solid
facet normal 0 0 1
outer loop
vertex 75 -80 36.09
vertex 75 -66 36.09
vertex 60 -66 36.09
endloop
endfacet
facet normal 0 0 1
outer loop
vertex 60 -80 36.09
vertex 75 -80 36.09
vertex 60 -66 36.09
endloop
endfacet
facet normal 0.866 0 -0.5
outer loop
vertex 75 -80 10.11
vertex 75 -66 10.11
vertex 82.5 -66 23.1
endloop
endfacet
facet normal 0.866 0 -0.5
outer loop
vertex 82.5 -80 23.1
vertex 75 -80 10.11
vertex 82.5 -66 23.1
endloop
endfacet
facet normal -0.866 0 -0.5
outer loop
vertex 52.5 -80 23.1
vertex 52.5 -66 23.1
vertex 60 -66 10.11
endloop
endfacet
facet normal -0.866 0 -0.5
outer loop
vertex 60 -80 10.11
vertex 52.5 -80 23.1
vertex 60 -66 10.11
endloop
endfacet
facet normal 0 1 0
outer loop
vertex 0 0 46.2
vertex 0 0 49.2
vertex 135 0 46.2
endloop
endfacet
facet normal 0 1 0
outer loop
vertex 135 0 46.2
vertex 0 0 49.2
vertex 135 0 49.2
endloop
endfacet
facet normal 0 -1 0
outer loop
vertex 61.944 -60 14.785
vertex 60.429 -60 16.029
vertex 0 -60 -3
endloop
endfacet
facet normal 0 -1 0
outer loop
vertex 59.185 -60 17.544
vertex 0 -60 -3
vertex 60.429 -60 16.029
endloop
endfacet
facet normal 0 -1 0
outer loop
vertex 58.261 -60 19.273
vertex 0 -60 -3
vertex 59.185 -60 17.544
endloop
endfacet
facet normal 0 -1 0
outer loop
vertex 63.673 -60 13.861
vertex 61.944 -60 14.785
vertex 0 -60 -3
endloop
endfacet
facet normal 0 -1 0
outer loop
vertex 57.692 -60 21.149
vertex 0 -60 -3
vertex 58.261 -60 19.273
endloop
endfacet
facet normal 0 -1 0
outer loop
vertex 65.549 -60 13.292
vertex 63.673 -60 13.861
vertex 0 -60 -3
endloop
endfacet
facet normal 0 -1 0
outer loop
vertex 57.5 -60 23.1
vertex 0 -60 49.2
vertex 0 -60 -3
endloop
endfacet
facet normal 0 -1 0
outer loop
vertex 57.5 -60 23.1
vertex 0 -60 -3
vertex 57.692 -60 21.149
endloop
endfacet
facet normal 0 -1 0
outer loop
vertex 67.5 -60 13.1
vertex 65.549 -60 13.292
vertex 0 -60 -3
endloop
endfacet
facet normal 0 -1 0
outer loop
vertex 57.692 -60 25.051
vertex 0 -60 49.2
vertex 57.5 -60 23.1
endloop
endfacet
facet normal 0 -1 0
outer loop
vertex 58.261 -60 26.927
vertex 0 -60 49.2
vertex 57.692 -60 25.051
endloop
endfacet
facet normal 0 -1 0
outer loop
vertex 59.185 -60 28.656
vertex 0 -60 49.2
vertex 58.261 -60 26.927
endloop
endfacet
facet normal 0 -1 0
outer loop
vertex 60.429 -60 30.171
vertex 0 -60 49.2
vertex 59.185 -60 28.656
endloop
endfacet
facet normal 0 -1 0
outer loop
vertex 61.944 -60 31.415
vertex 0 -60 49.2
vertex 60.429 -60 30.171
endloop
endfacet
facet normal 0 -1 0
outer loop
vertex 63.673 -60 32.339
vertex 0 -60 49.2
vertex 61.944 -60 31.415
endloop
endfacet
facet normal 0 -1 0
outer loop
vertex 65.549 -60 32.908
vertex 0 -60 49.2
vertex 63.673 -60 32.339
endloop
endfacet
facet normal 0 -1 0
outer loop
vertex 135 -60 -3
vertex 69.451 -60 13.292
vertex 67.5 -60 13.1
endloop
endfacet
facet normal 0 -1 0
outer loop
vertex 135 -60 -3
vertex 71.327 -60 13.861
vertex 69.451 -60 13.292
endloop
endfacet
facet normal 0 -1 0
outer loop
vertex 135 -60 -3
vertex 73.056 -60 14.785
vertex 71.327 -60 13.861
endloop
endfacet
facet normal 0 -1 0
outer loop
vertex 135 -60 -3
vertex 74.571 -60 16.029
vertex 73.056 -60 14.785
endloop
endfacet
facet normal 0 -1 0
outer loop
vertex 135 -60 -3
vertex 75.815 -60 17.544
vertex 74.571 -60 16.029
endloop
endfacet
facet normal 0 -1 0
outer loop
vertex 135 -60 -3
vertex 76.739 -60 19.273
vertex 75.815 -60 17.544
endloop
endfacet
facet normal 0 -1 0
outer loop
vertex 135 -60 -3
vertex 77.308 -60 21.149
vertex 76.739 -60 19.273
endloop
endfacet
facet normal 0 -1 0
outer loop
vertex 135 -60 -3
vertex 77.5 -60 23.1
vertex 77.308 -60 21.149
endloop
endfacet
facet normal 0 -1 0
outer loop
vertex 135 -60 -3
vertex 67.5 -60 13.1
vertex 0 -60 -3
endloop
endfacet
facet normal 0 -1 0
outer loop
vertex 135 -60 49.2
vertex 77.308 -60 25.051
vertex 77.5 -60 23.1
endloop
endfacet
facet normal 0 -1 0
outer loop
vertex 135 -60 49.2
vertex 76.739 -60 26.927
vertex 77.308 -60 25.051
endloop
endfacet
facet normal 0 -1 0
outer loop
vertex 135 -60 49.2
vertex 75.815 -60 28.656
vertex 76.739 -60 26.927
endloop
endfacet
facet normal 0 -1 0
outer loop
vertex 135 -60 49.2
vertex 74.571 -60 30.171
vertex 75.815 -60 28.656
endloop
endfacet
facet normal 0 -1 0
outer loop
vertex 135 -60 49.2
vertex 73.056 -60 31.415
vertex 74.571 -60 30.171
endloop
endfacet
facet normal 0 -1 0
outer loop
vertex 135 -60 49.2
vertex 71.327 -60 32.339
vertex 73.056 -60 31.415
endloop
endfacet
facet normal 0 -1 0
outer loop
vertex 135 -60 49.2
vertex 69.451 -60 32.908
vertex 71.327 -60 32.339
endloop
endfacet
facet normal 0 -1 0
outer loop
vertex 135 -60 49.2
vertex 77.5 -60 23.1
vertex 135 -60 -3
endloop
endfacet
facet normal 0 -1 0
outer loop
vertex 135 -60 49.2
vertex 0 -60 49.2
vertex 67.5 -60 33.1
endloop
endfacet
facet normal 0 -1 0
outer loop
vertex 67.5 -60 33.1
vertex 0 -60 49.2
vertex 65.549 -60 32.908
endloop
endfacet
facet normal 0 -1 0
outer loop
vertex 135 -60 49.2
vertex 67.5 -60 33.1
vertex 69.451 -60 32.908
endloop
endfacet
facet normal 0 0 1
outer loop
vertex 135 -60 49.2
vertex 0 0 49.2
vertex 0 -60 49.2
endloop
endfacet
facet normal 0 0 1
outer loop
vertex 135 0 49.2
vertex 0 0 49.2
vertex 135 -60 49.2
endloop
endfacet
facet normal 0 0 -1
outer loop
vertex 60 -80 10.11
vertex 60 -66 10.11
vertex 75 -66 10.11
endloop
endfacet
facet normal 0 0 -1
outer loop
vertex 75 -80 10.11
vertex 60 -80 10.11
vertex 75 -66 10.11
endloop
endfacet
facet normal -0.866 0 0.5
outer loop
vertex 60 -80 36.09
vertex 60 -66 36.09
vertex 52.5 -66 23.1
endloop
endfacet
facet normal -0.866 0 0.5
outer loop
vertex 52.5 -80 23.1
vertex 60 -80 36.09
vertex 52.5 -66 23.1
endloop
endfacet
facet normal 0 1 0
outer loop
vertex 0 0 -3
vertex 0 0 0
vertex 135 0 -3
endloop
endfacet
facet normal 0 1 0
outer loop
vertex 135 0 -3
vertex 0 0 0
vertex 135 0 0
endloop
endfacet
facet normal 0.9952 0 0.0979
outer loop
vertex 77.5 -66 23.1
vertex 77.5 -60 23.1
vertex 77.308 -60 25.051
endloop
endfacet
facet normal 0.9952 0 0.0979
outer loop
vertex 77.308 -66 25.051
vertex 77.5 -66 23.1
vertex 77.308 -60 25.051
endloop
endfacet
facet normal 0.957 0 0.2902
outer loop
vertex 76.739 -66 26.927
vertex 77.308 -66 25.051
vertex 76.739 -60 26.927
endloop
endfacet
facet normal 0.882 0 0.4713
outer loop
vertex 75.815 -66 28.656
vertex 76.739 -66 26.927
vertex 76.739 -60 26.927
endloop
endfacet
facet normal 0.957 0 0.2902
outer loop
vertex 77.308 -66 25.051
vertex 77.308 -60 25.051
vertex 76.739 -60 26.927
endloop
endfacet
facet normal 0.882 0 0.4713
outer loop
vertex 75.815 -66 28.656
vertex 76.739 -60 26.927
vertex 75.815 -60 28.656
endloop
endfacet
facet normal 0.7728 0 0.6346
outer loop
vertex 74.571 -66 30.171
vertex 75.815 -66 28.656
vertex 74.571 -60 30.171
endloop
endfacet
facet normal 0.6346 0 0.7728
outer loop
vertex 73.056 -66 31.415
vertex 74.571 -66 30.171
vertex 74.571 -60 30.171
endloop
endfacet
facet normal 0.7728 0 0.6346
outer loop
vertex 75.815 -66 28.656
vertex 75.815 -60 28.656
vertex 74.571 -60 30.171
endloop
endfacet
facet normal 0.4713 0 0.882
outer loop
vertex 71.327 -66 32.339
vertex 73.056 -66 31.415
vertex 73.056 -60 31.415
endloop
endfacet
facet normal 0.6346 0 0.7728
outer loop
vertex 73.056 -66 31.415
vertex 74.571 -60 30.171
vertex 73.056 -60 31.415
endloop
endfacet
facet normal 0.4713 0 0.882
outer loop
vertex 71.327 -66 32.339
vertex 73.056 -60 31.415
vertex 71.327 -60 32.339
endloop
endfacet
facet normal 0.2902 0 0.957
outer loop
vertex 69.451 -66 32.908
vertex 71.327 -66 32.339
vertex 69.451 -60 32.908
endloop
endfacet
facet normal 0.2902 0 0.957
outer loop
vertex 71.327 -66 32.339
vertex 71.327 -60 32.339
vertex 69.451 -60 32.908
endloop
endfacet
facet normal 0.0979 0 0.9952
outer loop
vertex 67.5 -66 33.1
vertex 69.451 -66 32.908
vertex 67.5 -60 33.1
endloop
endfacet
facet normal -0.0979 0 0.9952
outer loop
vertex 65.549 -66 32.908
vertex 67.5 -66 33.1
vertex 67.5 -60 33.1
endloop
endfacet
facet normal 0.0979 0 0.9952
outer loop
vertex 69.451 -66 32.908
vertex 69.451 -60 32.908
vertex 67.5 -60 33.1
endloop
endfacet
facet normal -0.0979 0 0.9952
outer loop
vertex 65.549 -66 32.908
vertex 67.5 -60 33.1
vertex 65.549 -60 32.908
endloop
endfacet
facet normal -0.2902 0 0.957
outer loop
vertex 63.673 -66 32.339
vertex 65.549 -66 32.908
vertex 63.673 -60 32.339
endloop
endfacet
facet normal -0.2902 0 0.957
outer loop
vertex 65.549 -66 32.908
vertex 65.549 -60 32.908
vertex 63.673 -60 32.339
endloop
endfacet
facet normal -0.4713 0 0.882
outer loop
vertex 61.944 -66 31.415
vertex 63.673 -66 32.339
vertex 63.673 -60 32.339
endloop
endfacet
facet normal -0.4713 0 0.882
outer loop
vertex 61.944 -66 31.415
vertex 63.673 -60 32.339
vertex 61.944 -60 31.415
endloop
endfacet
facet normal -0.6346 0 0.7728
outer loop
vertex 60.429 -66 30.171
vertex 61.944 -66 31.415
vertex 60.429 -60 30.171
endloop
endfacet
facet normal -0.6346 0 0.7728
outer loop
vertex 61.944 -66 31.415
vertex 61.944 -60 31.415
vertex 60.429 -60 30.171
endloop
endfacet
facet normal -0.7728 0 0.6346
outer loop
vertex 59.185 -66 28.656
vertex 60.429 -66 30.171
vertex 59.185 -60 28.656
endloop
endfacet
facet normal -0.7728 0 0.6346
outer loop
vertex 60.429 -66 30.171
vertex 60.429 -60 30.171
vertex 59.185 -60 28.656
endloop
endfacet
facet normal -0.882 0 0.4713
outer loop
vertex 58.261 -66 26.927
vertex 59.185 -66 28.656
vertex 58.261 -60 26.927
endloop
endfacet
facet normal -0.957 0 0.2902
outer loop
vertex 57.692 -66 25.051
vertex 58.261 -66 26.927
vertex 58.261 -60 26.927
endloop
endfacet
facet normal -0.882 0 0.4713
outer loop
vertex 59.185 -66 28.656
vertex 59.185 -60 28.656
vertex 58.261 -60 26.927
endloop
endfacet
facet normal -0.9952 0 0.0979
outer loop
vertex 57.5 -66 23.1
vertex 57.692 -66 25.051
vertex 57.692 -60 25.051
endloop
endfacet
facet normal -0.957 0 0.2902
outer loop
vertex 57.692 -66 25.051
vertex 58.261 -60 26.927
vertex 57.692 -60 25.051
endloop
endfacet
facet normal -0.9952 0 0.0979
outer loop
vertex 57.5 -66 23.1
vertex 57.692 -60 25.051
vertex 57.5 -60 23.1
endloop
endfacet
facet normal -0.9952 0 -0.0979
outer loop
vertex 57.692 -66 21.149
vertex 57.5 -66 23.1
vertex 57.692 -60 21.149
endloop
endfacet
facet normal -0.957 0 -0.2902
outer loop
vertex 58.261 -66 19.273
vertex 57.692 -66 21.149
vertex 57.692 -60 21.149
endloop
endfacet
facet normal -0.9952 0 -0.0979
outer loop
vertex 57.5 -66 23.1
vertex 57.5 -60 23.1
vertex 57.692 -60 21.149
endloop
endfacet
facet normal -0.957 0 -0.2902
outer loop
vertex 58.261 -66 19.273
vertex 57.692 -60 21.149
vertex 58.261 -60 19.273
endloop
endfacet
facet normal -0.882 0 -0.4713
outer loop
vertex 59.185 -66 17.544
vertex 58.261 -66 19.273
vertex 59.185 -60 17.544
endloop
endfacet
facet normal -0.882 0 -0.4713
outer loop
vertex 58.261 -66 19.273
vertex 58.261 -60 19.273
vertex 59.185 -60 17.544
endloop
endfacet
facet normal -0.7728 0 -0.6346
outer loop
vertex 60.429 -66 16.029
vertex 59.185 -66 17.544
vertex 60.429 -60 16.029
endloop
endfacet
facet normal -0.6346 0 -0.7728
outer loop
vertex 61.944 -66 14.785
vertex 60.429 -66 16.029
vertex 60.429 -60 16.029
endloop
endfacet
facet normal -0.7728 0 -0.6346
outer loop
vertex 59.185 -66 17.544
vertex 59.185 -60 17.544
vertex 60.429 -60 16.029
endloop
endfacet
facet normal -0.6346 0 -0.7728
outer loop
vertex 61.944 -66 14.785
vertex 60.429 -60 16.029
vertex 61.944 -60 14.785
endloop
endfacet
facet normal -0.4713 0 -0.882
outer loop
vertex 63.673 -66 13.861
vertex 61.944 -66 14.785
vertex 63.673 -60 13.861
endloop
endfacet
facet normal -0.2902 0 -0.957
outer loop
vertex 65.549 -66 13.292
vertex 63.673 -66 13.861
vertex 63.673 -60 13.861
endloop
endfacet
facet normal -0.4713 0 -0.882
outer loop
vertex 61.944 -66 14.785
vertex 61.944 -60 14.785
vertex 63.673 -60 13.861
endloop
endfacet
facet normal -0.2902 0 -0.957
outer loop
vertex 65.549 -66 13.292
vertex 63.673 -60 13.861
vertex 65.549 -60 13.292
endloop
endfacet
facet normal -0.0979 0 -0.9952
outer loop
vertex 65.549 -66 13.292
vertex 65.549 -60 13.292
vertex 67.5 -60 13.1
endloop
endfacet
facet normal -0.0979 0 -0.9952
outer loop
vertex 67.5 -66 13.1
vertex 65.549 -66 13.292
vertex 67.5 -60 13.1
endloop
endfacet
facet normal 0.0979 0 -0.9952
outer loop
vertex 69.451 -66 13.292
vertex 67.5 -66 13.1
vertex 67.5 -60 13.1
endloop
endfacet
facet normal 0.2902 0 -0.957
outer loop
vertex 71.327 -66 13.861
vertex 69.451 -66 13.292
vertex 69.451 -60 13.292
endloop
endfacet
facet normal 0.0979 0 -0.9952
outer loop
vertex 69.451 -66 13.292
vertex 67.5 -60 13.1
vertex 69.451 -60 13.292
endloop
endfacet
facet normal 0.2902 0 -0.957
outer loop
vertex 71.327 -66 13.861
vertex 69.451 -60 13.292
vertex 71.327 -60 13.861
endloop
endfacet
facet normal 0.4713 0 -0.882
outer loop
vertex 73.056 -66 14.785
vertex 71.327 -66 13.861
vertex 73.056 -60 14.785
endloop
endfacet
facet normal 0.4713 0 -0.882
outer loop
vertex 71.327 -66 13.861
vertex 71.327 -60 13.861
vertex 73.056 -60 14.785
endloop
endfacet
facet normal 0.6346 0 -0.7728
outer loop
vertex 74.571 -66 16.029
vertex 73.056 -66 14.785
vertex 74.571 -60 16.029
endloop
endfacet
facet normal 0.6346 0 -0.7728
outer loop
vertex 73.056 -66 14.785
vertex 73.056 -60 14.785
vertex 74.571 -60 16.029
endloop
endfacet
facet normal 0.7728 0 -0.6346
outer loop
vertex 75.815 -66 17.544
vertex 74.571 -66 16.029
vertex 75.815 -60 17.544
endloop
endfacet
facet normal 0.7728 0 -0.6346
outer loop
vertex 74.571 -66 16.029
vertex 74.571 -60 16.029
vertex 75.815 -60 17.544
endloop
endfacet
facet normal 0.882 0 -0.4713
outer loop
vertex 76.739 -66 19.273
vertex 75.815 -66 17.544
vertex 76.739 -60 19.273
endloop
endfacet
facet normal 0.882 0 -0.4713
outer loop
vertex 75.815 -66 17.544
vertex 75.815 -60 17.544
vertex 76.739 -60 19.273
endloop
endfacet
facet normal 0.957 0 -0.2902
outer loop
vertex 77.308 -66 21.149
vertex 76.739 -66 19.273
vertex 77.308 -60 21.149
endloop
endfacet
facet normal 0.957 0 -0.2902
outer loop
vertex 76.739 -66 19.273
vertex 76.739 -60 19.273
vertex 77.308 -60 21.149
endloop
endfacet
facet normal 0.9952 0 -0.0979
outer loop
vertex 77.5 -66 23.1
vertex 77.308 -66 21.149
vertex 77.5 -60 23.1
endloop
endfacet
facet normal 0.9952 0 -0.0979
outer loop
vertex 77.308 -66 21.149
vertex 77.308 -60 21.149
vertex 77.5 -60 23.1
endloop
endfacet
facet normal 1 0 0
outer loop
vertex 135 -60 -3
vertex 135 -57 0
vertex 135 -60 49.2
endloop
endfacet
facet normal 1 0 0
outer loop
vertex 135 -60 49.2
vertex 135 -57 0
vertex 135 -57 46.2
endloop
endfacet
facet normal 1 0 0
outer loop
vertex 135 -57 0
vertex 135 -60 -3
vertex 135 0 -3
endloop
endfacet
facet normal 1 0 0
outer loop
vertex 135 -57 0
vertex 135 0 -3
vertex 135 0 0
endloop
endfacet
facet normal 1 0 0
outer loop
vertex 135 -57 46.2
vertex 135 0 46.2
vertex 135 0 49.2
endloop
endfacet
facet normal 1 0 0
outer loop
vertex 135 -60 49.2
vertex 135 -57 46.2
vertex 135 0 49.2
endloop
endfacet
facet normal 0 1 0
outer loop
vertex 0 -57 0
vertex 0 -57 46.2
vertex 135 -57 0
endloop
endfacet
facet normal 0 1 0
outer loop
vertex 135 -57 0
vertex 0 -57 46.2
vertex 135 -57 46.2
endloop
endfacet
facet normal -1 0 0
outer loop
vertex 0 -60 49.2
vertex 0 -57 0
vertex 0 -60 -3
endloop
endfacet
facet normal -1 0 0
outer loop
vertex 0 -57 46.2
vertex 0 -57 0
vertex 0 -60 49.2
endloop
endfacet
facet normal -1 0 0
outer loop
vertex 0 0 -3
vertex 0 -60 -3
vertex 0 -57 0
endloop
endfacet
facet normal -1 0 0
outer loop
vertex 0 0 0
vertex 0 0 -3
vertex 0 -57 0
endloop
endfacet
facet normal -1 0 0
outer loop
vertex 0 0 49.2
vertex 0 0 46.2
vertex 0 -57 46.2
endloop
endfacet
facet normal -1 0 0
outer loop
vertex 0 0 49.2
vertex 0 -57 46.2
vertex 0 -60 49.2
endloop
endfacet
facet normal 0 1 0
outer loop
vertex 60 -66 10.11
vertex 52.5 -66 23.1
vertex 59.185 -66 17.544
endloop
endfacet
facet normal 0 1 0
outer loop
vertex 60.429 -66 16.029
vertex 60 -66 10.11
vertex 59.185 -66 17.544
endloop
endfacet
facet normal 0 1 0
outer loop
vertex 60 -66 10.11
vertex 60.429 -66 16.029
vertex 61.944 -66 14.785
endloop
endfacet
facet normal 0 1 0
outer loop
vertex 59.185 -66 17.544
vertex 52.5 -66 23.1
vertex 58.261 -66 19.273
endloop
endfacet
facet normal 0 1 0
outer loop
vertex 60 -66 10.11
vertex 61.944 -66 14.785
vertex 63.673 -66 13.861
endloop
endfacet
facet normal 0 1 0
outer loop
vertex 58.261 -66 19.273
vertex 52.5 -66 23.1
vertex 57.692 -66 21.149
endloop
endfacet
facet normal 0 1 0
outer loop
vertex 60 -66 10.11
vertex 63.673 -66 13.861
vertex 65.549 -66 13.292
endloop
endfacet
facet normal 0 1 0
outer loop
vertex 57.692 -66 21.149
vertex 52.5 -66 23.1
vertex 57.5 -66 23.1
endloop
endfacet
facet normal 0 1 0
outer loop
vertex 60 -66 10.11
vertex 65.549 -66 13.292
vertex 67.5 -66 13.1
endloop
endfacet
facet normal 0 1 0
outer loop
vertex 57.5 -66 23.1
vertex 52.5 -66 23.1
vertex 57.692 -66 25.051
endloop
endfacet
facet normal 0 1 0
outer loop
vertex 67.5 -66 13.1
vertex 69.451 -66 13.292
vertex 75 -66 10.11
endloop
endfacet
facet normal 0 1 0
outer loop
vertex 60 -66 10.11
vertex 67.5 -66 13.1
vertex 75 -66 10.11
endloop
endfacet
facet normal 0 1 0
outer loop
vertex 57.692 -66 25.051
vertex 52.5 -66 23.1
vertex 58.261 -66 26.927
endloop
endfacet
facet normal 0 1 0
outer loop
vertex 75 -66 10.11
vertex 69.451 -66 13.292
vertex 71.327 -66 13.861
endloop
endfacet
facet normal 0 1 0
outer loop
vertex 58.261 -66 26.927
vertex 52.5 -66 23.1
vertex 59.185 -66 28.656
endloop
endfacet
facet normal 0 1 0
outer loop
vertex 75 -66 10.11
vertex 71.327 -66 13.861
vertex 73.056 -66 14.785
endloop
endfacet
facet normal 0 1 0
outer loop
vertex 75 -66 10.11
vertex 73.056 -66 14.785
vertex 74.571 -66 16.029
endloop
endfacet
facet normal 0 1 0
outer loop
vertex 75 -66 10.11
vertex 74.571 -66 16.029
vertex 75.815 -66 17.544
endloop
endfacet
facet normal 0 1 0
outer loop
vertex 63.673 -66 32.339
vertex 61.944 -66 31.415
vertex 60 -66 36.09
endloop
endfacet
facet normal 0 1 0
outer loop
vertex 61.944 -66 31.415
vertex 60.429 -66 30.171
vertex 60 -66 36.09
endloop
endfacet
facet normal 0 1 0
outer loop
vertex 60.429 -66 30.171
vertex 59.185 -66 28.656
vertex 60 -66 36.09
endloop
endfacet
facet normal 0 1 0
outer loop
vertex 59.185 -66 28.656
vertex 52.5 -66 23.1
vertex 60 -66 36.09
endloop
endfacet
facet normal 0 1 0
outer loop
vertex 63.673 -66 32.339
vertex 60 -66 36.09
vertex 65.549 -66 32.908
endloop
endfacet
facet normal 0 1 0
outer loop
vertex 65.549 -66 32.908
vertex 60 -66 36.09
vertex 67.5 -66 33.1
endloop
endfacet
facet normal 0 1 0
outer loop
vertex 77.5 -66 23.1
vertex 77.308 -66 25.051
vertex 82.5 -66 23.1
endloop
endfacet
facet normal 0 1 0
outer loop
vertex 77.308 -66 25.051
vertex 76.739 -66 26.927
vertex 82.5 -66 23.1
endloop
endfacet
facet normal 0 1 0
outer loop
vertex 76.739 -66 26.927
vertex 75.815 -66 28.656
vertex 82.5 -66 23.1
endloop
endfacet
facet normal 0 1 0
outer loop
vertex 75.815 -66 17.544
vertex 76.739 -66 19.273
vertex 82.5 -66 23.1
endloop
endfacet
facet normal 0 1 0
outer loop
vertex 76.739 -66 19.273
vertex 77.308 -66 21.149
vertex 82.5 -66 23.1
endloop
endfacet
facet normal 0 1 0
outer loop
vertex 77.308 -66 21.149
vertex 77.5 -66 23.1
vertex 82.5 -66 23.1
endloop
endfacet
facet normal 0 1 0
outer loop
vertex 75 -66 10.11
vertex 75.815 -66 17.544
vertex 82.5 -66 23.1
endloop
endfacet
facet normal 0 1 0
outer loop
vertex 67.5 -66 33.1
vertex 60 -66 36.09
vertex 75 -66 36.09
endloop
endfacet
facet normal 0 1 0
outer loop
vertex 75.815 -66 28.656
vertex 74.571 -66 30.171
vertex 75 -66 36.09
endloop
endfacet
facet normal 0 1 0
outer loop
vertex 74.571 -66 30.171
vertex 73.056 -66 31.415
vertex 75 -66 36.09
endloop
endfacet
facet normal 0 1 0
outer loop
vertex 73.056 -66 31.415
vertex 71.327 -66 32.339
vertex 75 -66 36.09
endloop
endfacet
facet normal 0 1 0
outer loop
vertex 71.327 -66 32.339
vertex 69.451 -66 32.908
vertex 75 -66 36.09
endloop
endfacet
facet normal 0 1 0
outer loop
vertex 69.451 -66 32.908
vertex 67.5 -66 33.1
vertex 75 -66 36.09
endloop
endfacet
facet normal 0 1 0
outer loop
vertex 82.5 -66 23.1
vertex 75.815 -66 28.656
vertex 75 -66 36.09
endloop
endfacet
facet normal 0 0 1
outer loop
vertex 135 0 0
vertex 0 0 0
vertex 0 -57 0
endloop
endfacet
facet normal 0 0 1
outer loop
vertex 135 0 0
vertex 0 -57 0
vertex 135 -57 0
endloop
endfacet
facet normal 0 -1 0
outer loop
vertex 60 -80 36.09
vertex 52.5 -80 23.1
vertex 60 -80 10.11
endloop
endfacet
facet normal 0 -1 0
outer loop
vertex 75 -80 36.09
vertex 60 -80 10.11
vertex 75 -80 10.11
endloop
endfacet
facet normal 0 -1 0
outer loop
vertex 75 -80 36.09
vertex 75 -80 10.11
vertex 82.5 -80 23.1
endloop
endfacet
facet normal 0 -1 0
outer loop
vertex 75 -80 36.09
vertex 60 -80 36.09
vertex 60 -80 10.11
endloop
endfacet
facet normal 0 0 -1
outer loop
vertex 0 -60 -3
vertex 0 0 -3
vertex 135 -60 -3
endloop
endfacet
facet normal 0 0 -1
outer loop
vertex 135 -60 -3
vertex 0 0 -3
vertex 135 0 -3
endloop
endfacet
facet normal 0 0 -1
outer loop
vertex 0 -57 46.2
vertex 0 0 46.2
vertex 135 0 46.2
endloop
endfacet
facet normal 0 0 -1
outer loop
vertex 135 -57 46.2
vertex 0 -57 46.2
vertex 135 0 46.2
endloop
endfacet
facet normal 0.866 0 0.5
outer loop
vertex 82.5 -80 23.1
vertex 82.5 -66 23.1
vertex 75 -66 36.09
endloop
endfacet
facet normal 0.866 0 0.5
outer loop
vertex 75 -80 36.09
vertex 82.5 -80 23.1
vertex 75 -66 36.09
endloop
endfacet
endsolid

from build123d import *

# Parameters (mm, degrees)
SKETCH018_W    = 135
SKETCH018_H    = 46.2
PAD008_DEPTH   = 57
THICKNESS001_T = 3
SKETCH019_R    = 10
PAD009_DEPTH   = 6
PAD010_DEPTH   = 14


with BuildPart() as part:
    # Sketch018 → Pad008 (new body)
    with BuildSketch(Plane.XZ):
        with Locations((67.5, 23.1)):
            Rectangle(SKETCH018_W, SKETCH018_H)
    extrude(amount=PAD008_DEPTH)

    # Thickness001
    thickness001_openings = [part.faces().sort_by_distance(p)[0] for p in [
        (135, -28.5, 23.1),
        (67.5, 0, 23.1),
        (0, -28.5, 23.1),
    ]]
    offset(amount=THICKNESS001_T, openings=thickness001_openings, kind=Kind.INTERSECTION)

    # Sketch019 (on Face10 of Thickness001) → Pad009 (join)
    with BuildSketch(Plane.XZ.offset(60)):
        with Locations((67.5, 23.1)):
            Circle(SKETCH019_R)
    extrude(amount=PAD009_DEPTH)

    # Sketch020 (on Face12 of Pad009) → Pad010 (join)
    with BuildSketch(Plane.XZ.offset(66)):
        Polygon((60, 36.090381), (52.5, 23.1), (60, 10.109619), (75, 10.109619), (82.5, 23.1), (75, 36.090381), align=None)
    extrude(amount=PAD010_DEPTH)


solid = part.part
